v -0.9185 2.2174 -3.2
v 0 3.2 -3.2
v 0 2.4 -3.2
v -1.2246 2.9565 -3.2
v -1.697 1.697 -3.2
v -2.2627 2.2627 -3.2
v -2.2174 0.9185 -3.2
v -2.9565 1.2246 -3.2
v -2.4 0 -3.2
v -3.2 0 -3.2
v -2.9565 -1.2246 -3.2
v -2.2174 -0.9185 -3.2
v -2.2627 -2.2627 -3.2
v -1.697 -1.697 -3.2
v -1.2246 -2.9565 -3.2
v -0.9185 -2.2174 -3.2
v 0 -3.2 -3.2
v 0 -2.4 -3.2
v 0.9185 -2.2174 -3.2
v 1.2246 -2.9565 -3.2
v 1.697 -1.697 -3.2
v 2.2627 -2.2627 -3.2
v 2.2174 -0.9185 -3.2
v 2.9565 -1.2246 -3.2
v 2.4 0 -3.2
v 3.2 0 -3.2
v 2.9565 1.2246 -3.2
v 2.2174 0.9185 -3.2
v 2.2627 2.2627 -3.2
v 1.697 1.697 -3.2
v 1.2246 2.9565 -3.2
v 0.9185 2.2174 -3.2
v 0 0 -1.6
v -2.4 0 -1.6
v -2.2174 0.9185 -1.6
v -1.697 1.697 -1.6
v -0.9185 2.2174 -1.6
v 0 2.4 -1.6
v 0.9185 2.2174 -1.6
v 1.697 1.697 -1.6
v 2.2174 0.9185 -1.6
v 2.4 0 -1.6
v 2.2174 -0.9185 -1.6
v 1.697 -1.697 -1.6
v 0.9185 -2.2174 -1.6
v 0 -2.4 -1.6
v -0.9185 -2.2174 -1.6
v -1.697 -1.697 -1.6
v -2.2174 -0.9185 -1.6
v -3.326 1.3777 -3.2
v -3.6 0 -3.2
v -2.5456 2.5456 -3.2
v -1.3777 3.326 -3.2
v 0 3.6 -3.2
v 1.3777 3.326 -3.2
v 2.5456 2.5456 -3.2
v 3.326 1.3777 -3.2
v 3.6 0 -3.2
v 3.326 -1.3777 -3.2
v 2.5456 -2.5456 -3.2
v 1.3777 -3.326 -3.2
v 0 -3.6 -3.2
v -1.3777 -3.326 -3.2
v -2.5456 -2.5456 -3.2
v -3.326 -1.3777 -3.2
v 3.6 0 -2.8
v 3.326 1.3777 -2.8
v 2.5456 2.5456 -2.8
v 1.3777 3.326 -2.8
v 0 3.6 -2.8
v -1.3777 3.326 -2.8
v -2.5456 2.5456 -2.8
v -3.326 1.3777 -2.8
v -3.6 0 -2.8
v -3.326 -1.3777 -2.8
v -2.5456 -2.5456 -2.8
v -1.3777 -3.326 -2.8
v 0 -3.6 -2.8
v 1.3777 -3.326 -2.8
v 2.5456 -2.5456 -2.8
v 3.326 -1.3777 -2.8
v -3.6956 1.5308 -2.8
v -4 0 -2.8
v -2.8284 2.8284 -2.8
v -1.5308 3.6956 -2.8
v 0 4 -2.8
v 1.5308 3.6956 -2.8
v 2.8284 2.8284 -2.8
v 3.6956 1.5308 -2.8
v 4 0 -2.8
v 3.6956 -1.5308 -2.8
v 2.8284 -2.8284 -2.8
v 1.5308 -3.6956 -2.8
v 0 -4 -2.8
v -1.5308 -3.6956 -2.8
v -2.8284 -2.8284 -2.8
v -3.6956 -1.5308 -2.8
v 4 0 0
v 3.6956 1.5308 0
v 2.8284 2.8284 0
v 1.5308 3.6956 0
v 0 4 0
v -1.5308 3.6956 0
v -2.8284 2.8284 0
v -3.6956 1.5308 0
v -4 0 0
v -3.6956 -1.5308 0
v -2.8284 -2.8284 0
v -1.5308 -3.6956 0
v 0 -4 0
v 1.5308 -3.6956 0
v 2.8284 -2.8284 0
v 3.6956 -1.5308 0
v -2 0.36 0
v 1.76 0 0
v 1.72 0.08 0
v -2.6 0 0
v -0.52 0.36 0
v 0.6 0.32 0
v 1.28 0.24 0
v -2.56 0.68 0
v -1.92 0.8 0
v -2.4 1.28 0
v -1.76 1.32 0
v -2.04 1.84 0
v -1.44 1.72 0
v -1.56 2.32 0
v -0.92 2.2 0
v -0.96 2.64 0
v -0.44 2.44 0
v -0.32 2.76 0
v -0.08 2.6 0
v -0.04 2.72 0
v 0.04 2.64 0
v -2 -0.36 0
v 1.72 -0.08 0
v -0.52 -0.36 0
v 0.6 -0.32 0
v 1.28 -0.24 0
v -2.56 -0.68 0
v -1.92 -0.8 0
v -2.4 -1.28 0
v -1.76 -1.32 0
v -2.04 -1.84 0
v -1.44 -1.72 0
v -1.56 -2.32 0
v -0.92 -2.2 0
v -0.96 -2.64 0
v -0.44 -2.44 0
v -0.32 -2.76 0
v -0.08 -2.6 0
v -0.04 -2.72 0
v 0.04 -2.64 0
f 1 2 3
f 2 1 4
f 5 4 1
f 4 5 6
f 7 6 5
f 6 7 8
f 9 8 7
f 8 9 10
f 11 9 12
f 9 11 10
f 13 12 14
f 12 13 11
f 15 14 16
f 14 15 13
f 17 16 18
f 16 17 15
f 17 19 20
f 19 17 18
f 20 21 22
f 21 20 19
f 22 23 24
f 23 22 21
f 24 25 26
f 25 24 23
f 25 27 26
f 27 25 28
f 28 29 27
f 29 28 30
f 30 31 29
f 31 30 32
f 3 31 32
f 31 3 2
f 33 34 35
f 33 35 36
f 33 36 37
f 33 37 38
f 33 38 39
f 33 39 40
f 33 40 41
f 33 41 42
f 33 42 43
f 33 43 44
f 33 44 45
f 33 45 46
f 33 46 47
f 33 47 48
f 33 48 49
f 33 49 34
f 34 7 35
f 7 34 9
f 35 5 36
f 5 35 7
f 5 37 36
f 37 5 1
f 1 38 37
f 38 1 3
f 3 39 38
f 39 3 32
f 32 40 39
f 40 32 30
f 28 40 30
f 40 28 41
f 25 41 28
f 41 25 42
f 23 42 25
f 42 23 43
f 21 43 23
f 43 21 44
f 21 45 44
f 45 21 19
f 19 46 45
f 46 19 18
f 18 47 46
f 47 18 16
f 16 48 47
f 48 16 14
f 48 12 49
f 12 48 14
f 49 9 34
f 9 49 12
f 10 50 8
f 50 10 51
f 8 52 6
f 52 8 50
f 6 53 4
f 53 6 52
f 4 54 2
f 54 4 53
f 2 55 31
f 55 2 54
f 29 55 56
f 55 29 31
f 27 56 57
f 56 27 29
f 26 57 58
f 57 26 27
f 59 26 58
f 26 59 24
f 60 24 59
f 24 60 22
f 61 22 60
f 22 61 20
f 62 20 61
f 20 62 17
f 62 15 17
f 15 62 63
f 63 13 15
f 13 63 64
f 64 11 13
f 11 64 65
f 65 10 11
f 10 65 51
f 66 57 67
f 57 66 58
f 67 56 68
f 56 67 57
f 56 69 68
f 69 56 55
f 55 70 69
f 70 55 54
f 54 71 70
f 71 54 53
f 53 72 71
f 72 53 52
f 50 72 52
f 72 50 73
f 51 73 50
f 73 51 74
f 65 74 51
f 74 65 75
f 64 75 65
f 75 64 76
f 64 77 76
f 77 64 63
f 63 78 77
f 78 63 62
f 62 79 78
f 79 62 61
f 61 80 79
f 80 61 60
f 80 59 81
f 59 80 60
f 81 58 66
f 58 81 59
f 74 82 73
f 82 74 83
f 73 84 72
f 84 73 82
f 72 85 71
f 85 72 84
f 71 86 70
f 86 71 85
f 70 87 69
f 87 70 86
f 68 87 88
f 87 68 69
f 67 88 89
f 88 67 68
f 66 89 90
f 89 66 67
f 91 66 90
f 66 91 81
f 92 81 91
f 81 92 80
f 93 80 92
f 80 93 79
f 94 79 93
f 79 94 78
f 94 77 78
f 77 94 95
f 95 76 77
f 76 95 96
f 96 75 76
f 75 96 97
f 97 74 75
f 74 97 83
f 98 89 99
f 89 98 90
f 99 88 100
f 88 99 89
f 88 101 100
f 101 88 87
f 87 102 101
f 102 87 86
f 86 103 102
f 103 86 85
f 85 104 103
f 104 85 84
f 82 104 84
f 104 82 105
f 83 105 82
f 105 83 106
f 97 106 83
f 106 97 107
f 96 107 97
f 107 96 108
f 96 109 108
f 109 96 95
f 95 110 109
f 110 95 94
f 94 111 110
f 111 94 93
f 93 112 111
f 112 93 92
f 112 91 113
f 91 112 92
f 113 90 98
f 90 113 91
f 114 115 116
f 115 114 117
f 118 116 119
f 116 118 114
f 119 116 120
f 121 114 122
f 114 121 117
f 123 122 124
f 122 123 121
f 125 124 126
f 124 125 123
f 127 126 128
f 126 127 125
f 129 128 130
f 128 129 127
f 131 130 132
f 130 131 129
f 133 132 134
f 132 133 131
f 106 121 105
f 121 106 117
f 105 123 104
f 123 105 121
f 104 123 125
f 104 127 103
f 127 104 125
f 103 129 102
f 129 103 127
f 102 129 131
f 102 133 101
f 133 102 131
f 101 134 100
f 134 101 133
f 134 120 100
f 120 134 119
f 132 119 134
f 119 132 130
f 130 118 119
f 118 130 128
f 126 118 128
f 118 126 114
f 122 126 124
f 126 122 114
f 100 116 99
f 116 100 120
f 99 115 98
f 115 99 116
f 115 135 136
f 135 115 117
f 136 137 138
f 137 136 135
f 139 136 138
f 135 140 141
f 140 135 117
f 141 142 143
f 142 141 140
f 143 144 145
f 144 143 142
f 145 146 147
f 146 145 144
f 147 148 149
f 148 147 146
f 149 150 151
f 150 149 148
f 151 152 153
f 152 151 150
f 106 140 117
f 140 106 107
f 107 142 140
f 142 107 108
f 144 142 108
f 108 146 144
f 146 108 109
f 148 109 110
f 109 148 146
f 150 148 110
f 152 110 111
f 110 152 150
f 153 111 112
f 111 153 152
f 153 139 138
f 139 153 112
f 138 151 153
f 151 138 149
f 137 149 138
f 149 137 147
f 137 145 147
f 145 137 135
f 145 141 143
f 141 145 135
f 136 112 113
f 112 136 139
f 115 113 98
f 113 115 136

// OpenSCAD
// file: ../p/4-4disc.scad
use <../lib.scad>
function ldraw_lib__4_4disc() = [
// 0 Disc 1.0
// 0 Name: 4-4disc.dat
// 0 Author: James Jessiman
// 0 !LDRAW_ORG Primitive UPDATE 2002-02
// 0 !LICENSE Licensed under CC BY 4.0 : see CAreadme.txt
// 
// 0 BFC CERTIFY CCW
  [0,"BFC","CERTIFY"],
  [0,"BFC","CCW"],
// 
// 0 !HISTORY 1998-12-15 [PTadmin] Official Update 1998-10
// 0 !HISTORY 2002-03-23 [sbliss] Added BFC statement
// 0 !HISTORY 2002-04-25 [PTadmin] Official Update 2002-02
// 0 !HISTORY 2007-06-24 [PTadmin] Header formatted for Contributor Agreement
// 0 !HISTORY 2008-07-01 [PTadmin] Official Update 2008-01
// 
// 
// 3 16 0 0 0 1 0 0 0.9239 0 0.3827
  [3,16,0,0,0,1,0,0,0.9239,0,0.3827],
// 3 16 0 0 0 0.9239 0 0.3827 0.7071 0 0.7071
  [3,16,0,0,0,0.9239,0,0.3827,0.7071,0,0.7071],
// 3 16 0 0 0 0.7071 0 0.7071 0.3827 0 0.9239
  [3,16,0,0,0,0.7071,0,0.7071,0.3827,0,0.9239],
// 3 16 0 0 0 0.3827 0 0.9239 0 0 1
  [3,16,0,0,0,0.3827,0,0.9239,0,0,1],
// 3 16 0 0 0 0 0 1 -0.3827 0 0.9239
  [3,16,0,0,0,0,0,1,-0.3827,0,0.9239],
// 3 16 0 0 0 -0.3827 0 0.9239 -0.7071 0 0.7071
  [3,16,0,0,0,-0.3827,0,0.9239,-0.7071,0,0.7071],
// 3 16 0 0 0 -0.7071 0 0.7071 -0.9239 0 0.3827
  [3,16,0,0,0,-0.7071,0,0.7071,-0.9239,0,0.3827],
// 3 16 0 0 0 -0.9239 0 0.3827 -1 0 -0
  [3,16,0,0,0,-0.9239,0,0.3827,-1,0,-0],
// 3 16 0 0 0 -1 0 -0 -0.9239 0 -0.3827
  [3,16,0,0,0,-1,0,-0,-0.9239,0,-0.3827],
// 3 16 0 0 0 -0.9239 0 -0.3827 -0.7071 0 -0.7071
  [3,16,0,0,0,-0.9239,0,-0.3827,-0.7071,0,-0.7071],
// 3 16 0 0 0 -0.7071 0 -0.7071 -0.3827 0 -0.9239
  [3,16,0,0,0,-0.7071,0,-0.7071,-0.3827,0,-0.9239],
// 3 16 0 0 0 -0.3827 0 -0.9239 0 0 -1
  [3,16,0,0,0,-0.3827,0,-0.9239,0,0,-1],
// 3 16 0 0 0 0 0 -1 0.3827 0 -0.9239
  [3,16,0,0,0,0,0,-1,0.3827,0,-0.9239],
// 3 16 0 0 0 0.3827 0 -0.9239 0.7071 0 -0.7071
  [3,16,0,0,0,0.3827,0,-0.9239,0.7071,0,-0.7071],
// 3 16 0 0 0 0.7071 0 -0.7071 0.9239 0 -0.3827
  [3,16,0,0,0,0.7071,0,-0.7071,0.9239,0,-0.3827],
// 3 16 0 0 0 0.9239 0 -0.3827 1 0 0
  [3,16,0,0,0,0.9239,0,-0.3827,1,0,0],
// 0
];
module ldraw_lib__4_4disc(step=0, col=false, unit=2/5, alt=false, line=0.2, solid=!$preview)
    makepoly(ldraw_lib__4_4disc(), step=step, col=col, unit=unit, alt=alt, line=line, solid=solid);
ldraw_lib__4_4disc(line=0.2);
// file: ../p/4-4ring3.scad
use <../lib.scad>
function ldraw_lib__4_4ring3() = [
// 0 Ring  3 x 1.0
// 0 Name: 4-4ring3.dat
// 0 Author: James Jessiman
// 0 !LDRAW_ORG Primitive UPDATE 2009-01
// 0 !LICENSE Licensed under CC BY 4.0 : see CAreadme.txt
// 
// 0 BFC CERTIFY CCW
  [0,"BFC","CERTIFY"],
  [0,"BFC","CCW"],
// 
// 0 !HISTORY 1998-12-15 [PTadmin] Official Update 1998-10
// 0 !HISTORY 2002-04-05 [hafhead] Added BFC statement
// 0 !HISTORY 2002-04-25 [PTadmin] Official Update 2002-02
// 0 !HISTORY 2007-06-24 [PTadmin] Header formatted for Contributor Agreement
// 0 !HISTORY 2008-07-01 [PTadmin] Official Update 2008-01
// 0 !HISTORY 2008-08-26 [cwdee] Switch polygon winding and rename
// 0 !HISTORY 2009-05-02 [PTadmin] Official Update 2009-01
// 
// 
// 4 16 -1.5308 0 3.6956 -1.1481 0 2.7717 0 0 3 0 0 4
  [4,16,-1.5308,0,3.6956,-1.1481,0,2.7717,0,0,3,0,0,4],
// 4 16 -2.8284 0 2.8284 -2.1213 0 2.1213 -1.1481 0 2.7717 -1.5308 0 3.6956
  [4,16,-2.8284,0,2.8284,-2.1213,0,2.1213,-1.1481,0,2.7717,-1.5308,0,3.6956],
// 4 16 -3.6956 0 1.5308 -2.7717 0 1.1481 -2.1213 0 2.1213 -2.8284 0 2.8284
  [4,16,-3.6956,0,1.5308,-2.7717,0,1.1481,-2.1213,0,2.1213,-2.8284,0,2.8284],
// 4 16 -4 0 0 -3 0 0 -2.7717 0 1.1481 -3.6956 0 1.5308
  [4,16,-4,0,0,-3,0,0,-2.7717,0,1.1481,-3.6956,0,1.5308],
// 4 16 -3.6956 0 -1.5308 -2.7717 0 -1.1481 -3 0 0 -4 0 0
  [4,16,-3.6956,0,-1.5308,-2.7717,0,-1.1481,-3,0,0,-4,0,0],
// 4 16 -2.8284 0 -2.8284 -2.1213 0 -2.1213 -2.7717 0 -1.1481 -3.6956 0 -1.5308
  [4,16,-2.8284,0,-2.8284,-2.1213,0,-2.1213,-2.7717,0,-1.1481,-3.6956,0,-1.5308],
// 4 16 -1.5308 0 -3.6956 -1.1481 0 -2.7717 -2.1213 0 -2.1213 -2.8284 0 -2.8284
  [4,16,-1.5308,0,-3.6956,-1.1481,0,-2.7717,-2.1213,0,-2.1213,-2.8284,0,-2.8284],
// 4 16 0 0 -4 0 0 -3 -1.1481 0 -2.7717 -1.5308 0 -3.6956
  [4,16,0,0,-4,0,0,-3,-1.1481,0,-2.7717,-1.5308,0,-3.6956],
// 4 16 1.5308 0 -3.6956 1.1481 0 -2.7717 0 0 -3 0 0 -4
  [4,16,1.5308,0,-3.6956,1.1481,0,-2.7717,0,0,-3,0,0,-4],
// 4 16 2.8284 0 -2.8284 2.1213 0 -2.1213 1.1481 0 -2.7717 1.5308 0 -3.6956
  [4,16,2.8284,0,-2.8284,2.1213,0,-2.1213,1.1481,0,-2.7717,1.5308,0,-3.6956],
// 4 16 3.6956 0 -1.5308 2.7717 0 -1.1481 2.1213 0 -2.1213 2.8284 0 -2.8284
  [4,16,3.6956,0,-1.5308,2.7717,0,-1.1481,2.1213,0,-2.1213,2.8284,0,-2.8284],
// 4 16 4 0 0 3 0 0 2.7717 0 -1.1481 3.6956 0 -1.5308
  [4,16,4,0,0,3,0,0,2.7717,0,-1.1481,3.6956,0,-1.5308],
// 4 16 3.6956 0 1.5308 2.7717 0 1.1481 3 0 0 4 0 0
  [4,16,3.6956,0,1.5308,2.7717,0,1.1481,3,0,0,4,0,0],
// 4 16 2.8284 0 2.8284 2.1213 0 2.1213 2.7717 0 1.1481 3.6956 0 1.5308
  [4,16,2.8284,0,2.8284,2.1213,0,2.1213,2.7717,0,1.1481,3.6956,0,1.5308],
// 4 16 1.5308 0 3.6956 1.1481 0 2.7717 2.1213 0 2.1213 2.8284 0 2.8284
  [4,16,1.5308,0,3.6956,1.1481,0,2.7717,2.1213,0,2.1213,2.8284,0,2.8284],
// 4 16 0 0 4 0 0 3 1.1481 0 2.7717 1.5308 0 3.6956
  [4,16,0,0,4,0,0,3,1.1481,0,2.7717,1.5308,0,3.6956],
// 0
];
module ldraw_lib__4_4ring3(step=0, col=false, unit=2/5, alt=false, line=0.2, solid=!$preview)
    makepoly(ldraw_lib__4_4ring3(), step=step, col=col, unit=unit, alt=alt, line=line, solid=solid);
ldraw_lib__4_4ring3(line=0.2);
// file: ../p/4-4cylc.scad
use <../lib.scad>
use <4-4cyli.scad>
use <4-4disc.scad>
use <4-4edge.scad>
function ldraw_lib__4_4cylc() = [
// 0 Cylinder Closed 1.0
// 0 Name: 4-4cylc.dat
// 0 Author: Alex Taylor [anathema]
// 0 !LDRAW_ORG Primitive UPDATE 2009-02
// 0 !LICENSE Licensed under CC BY 4.0 : see CAreadme.txt
// 
// 0 BFC CERTIFY CCW
  [0,"BFC","CERTIFY"],
  [0,"BFC","CCW"],
// 
// 0 !HISTORY 2008-12-29 [cwdee] Removed one disc
// 0 !HISTORY 2009-09-03 [PTadmin] Official Update 2009-02
// 
// 
// 1 16 0 0 0 1 0 0 0 1 0 0 0 1 4-4edge.dat
  [1,16,0,0,0,1,0,0,0,1,0,0,0,1, ldraw_lib__4_4edge()],
// 1 16 0 1 0 1 0 0 0 1 0 0 0 1 4-4edge.dat
  [1,16,0,1,0,1,0,0,0,1,0,0,0,1, ldraw_lib__4_4edge()],
// 1 16 0 0 0 1 0 0 0 1 0 0 0 1 4-4disc.dat
  [1,16,0,0,0,1,0,0,0,1,0,0,0,1, ldraw_lib__4_4disc()],
// 1 16 0 0 0 1 0 0 0 1 0 0 0 1 4-4cyli.dat
  [1,16,0,0,0,1,0,0,0,1,0,0,0,1, ldraw_lib__4_4cyli()],
// 0
];
module ldraw_lib__4_4cylc(step=0, col=false, unit=2/5, alt=false, line=0.2, solid=!$preview)
    makepoly(ldraw_lib__4_4cylc(), step=step, col=col, unit=unit, alt=alt, line=line, solid=solid);
ldraw_lib__4_4cylc(line=0.2);
// file: ../p/4-4edge.scad
use <../lib.scad>
function ldraw_lib__4_4edge() = [
// 0 Circle 1.0
// 0 Name: 4-4edge.dat
// 0 Author: James Jessiman
// 0 !LDRAW_ORG Primitive UPDATE 2017-01
// 0 !LICENSE Licensed under CC BY 4.0 : see CAreadme.txt
// 
// 0 BFC CERTIFY CCW
  [0,"BFC","CERTIFY"],
  [0,"BFC","CCW"],
// 
// 0 !HISTORY 1998-12-15 [PTadmin] Official Update 1998-10
// 0 !HISTORY 2005-12-28 [PTadmin] Official Update 2005-01
// 0 !HISTORY 2007-06-24 [PTadmin] Header formatted for Contributor Agreement
// 0 !HISTORY 2008-07-01 [PTadmin] Official Update 2008-01
// 0 !HISTORY 2017-01-15 [Steffen] BFCed
// 0 !HISTORY 2017-12-30 [PTadmin] Official Update 2017-01
// 
// 
// 2 24 1 0 0 0.9239 0 0.3827
  [2,24,1,0,0,0.9239,0,0.3827],
// 2 24 0.9239 0 0.3827 0.7071 0 0.7071
  [2,24,0.9239,0,0.3827,0.7071,0,0.7071],
// 2 24 0.7071 0 0.7071 0.3827 0 0.9239
  [2,24,0.7071,0,0.7071,0.3827,0,0.9239],
// 2 24 0.3827 0 0.9239 0 0 1
  [2,24,0.3827,0,0.9239,0,0,1],
// 2 24 0 0 1 -0.3827 0 0.9239
  [2,24,0,0,1,-0.3827,0,0.9239],
// 2 24 -0.3827 0 0.9239 -0.7071 0 0.7071
  [2,24,-0.3827,0,0.9239,-0.7071,0,0.7071],
// 2 24 -0.7071 0 0.7071 -0.9239 0 0.3827
  [2,24,-0.7071,0,0.7071,-0.9239,0,0.3827],
// 2 24 -0.9239 0 0.3827 -1 0 -0
  [2,24,-0.9239,0,0.3827,-1,0,-0],
// 2 24 -1 0 -0 -0.9239 0 -0.3827
  [2,24,-1,0,-0,-0.9239,0,-0.3827],
// 2 24 -0.9239 0 -0.3827 -0.7071 0 -0.7071
  [2,24,-0.9239,0,-0.3827,-0.7071,0,-0.7071],
// 2 24 -0.7071 0 -0.7071 -0.3827 0 -0.9239
  [2,24,-0.7071,0,-0.7071,-0.3827,0,-0.9239],
// 2 24 -0.3827 0 -0.9239 0 0 -1
  [2,24,-0.3827,0,-0.9239,0,0,-1],
// 2 24 0 0 -1 0.3827 0 -0.9239
  [2,24,0,0,-1,0.3827,0,-0.9239],
// 2 24 0.3827 0 -0.9239 0.7071 0 -0.7071
  [2,24,0.3827,0,-0.9239,0.7071,0,-0.7071],
// 2 24 0.7071 0 -0.7071 0.9239 0 -0.3827
  [2,24,0.7071,0,-0.7071,0.9239,0,-0.3827],
// 2 24 0.9239 0 -0.3827 1 0 0
  [2,24,0.9239,0,-0.3827,1,0,0],
];
module ldraw_lib__4_4edge(step=0, col=false, unit=2/5, alt=false, line=0.2, solid=!$preview)
    makepoly(ldraw_lib__4_4edge(), step=step, col=col, unit=unit, alt=alt, line=line, solid=solid);
ldraw_lib__4_4edge(line=0.2);
// file: ../p/4-4cyli.scad
use <../lib.scad>
function ldraw_lib__4_4cyli() = [
// 0 Cylinder 1.0
// 0 Name: 4-4cyli.dat
// 0 Author: James Jessiman
// 0 !LDRAW_ORG Primitive UPDATE 2005-01
// 0 !LICENSE Licensed under CC BY 4.0 : see CAreadme.txt
// 
// 0 BFC CERTIFY CCW
  [0,"BFC","CERTIFY"],
  [0,"BFC","CCW"],
// 
// 0 !HISTORY 1998-12-15 [PTadmin] Official Update 1998-10
// 0 !HISTORY 2002-03-23 [sbliss] Added BFC statement; merged headers from files in distributions LDraw 0.27 and Complete.
// 0 !HISTORY 2002-04-25 [PTadmin] Official Update 2002-02
// 0 !HISTORY 2004-12-14 [guyvivan] BFC CCW
// 0 !HISTORY 2005-12-28 [PTadmin] Official Update 2005-01
// 0 !HISTORY 2007-06-24 [PTadmin] Header formatted for Contributor Agreement
// 0 !HISTORY 2008-07-01 [PTadmin] Official Update 2008-01
// 
// 
// 4 16 1 1 0 0.9239 1 0.3827 0.9239 0 0.3827 1 0 0
  [4,16,1,1,0,0.9239,1,0.3827,0.9239,0,0.3827,1,0,0],
// 5 24 1 0 0 1 1 0 0.9239 0 0.3827 0.9239 0 -0.3827
  [5,24,1,0,0,1,1,0,0.9239,0,0.3827,0.9239,0,-0.3827],
// 4 16 0.9239 1 0.3827 0.7071 1 0.7071 0.7071 0 0.7071 0.9239 0 0.3827
  [4,16,0.9239,1,0.3827,0.7071,1,0.7071,0.7071,0,0.7071,0.9239,0,0.3827],
// 5 24 0.9239 0 0.3827 0.9239 1 0.3827 0.7071 0 0.7071 1 0 0
  [5,24,0.9239,0,0.3827,0.9239,1,0.3827,0.7071,0,0.7071,1,0,0],
// 4 16 0.7071 1 0.7071 0.3827 1 0.9239 0.3827 0 0.9239 0.7071 0 0.7071
  [4,16,0.7071,1,0.7071,0.3827,1,0.9239,0.3827,0,0.9239,0.7071,0,0.7071],
// 5 24 0.7071 0 0.7071 0.7071 1 0.7071 0.3827 0 0.9239 0.9239 0 0.3827
  [5,24,0.7071,0,0.7071,0.7071,1,0.7071,0.3827,0,0.9239,0.9239,0,0.3827],
// 4 16 0.3827 1 0.9239 0 1 1 0 0 1 0.3827 0 0.9239
  [4,16,0.3827,1,0.9239,0,1,1,0,0,1,0.3827,0,0.9239],
// 5 24 0.3827 0 0.9239 0.3827 1 0.9239 0 0 1 0.7071 0 0.7071
  [5,24,0.3827,0,0.9239,0.3827,1,0.9239,0,0,1,0.7071,0,0.7071],
// 4 16 0 1 1 -0.3827 1 0.9239 -0.3827 0 0.9239 0 0 1
  [4,16,0,1,1,-0.3827,1,0.9239,-0.3827,0,0.9239,0,0,1],
// 5 24 0 0 1 0 1 1 -0.3827 0 0.9239 0.3827 0 0.9239
  [5,24,0,0,1,0,1,1,-0.3827,0,0.9239,0.3827,0,0.9239],
// 4 16 -0.3827 1 0.9239 -0.7071 1 0.7071 -0.7071 0 0.7071 -0.3827 0 0.9239
  [4,16,-0.3827,1,0.9239,-0.7071,1,0.7071,-0.7071,0,0.7071,-0.3827,0,0.9239],
// 5 24 -0.3827 0 0.9239 -0.3827 1 0.9239 -0.7071 0 0.7071 0 0 1
  [5,24,-0.3827,0,0.9239,-0.3827,1,0.9239,-0.7071,0,0.7071,0,0,1],
// 4 16 -0.7071 1 0.7071 -0.9239 1 0.3827 -0.9239 0 0.3827 -0.7071 0 0.7071
  [4,16,-0.7071,1,0.7071,-0.9239,1,0.3827,-0.9239,0,0.3827,-0.7071,0,0.7071],
// 5 24 -0.7071 0 0.7071 -0.7071 1 0.7071 -0.9239 0 0.3827 -0.3827 0 0.9239
  [5,24,-0.7071,0,0.7071,-0.7071,1,0.7071,-0.9239,0,0.3827,-0.3827,0,0.9239],
// 4 16 -0.9239 1 0.3827 -1 1 0 -1 0 0 -0.9239 0 0.3827
  [4,16,-0.9239,1,0.3827,-1,1,0,-1,0,0,-0.9239,0,0.3827],
// 5 24 -0.9239 0 0.3827 -0.9239 1 0.3827 -1 0 0 -0.7071 0 0.7071
  [5,24,-0.9239,0,0.3827,-0.9239,1,0.3827,-1,0,0,-0.7071,0,0.7071],
// 4 16 -1 1 0 -0.9239 1 -0.3827 -0.9239 0 -0.3827 -1 0 0
  [4,16,-1,1,0,-0.9239,1,-0.3827,-0.9239,0,-0.3827,-1,0,0],
// 5 24 -1 0 0 -1 1 0 -0.9239 0 -0.3827 -0.9239 0 0.3827
  [5,24,-1,0,0,-1,1,0,-0.9239,0,-0.3827,-0.9239,0,0.3827],
// 4 16 -0.9239 1 -0.3827 -0.7071 1 -0.7071 -0.7071 0 -0.7071 -0.9239 0 -0.3827
  [4,16,-0.9239,1,-0.3827,-0.7071,1,-0.7071,-0.7071,0,-0.7071,-0.9239,0,-0.3827],
// 5 24 -0.9239 0 -0.3827 -0.9239 1 -0.3827 -0.7071 0 -0.7071 -1 0 0
  [5,24,-0.9239,0,-0.3827,-0.9239,1,-0.3827,-0.7071,0,-0.7071,-1,0,0],
// 4 16 -0.7071 1 -0.7071 -0.3827 1 -0.9239 -0.3827 0 -0.9239 -0.7071 0 -0.7071
  [4,16,-0.7071,1,-0.7071,-0.3827,1,-0.9239,-0.3827,0,-0.9239,-0.7071,0,-0.7071],
// 5 24 -0.7071 0 -0.7071 -0.7071 1 -0.7071 -0.3827 0 -0.9239 -0.9239 0 -0.3827
  [5,24,-0.7071,0,-0.7071,-0.7071,1,-0.7071,-0.3827,0,-0.9239,-0.9239,0,-0.3827],
// 4 16 -0.3827 1 -0.9239 0 1 -1 0 0 -1 -0.3827 0 -0.9239
  [4,16,-0.3827,1,-0.9239,0,1,-1,0,0,-1,-0.3827,0,-0.9239],
// 5 24 -0.3827 0 -0.9239 -0.3827 1 -0.9239 0 0 -1 -0.7071 0 -0.7071
  [5,24,-0.3827,0,-0.9239,-0.3827,1,-0.9239,0,0,-1,-0.7071,0,-0.7071],
// 4 16 0 1 -1 0.3827 1 -0.9239 0.3827 0 -0.9239 0 0 -1
  [4,16,0,1,-1,0.3827,1,-0.9239,0.3827,0,-0.9239,0,0,-1],
// 5 24 0 0 -1 0 1 -1 0.3827 0 -0.9239 -0.3827 0 -0.9239
  [5,24,0,0,-1,0,1,-1,0.3827,0,-0.9239,-0.3827,0,-0.9239],
// 4 16 0.3827 1 -0.9239 0.7071 1 -0.7071 0.7071 0 -0.7071 0.3827 0 -0.9239
  [4,16,0.3827,1,-0.9239,0.7071,1,-0.7071,0.7071,0,-0.7071,0.3827,0,-0.9239],
// 5 24 0.3827 0 -0.9239 0.3827 1 -0.9239 0.7071 0 -0.7071 0 0 -1
  [5,24,0.3827,0,-0.9239,0.3827,1,-0.9239,0.7071,0,-0.7071,0,0,-1],
// 4 16 0.7071 1 -0.7071 0.9239 1 -0.3827 0.9239 0 -0.3827 0.7071 0 -0.7071
  [4,16,0.7071,1,-0.7071,0.9239,1,-0.3827,0.9239,0,-0.3827,0.7071,0,-0.7071],
// 5 24 0.7071 0 -0.7071 0.7071 1 -0.7071 0.9239 0 -0.3827 0.3827 0 -0.9239
  [5,24,0.7071,0,-0.7071,0.7071,1,-0.7071,0.9239,0,-0.3827,0.3827,0,-0.9239],
// 4 16 0.9239 1 -0.3827 1 1 0 1 0 0 0.9239 0 -0.3827
  [4,16,0.9239,1,-0.3827,1,1,0,1,0,0,0.9239,0,-0.3827],
// 5 24 0.9239 0 -0.3827 0.9239 1 -0.3827 1 0 0 0.7071 0 -0.7071
  [5,24,0.9239,0,-0.3827,0.9239,1,-0.3827,1,0,0,0.7071,0,-0.7071],
// 0
];
module ldraw_lib__4_4cyli(step=0, col=false, unit=2/5, alt=false, line=0.2, solid=!$preview)
    makepoly(ldraw_lib__4_4cyli(), step=step, col=col, unit=unit, alt=alt, line=line, solid=solid);
ldraw_lib__4_4cyli(line=0.2);
// file: ../p/empty.scad
use <../lib.scad>
function ldraw_lib__empty() = [
// 0 Empty
// 0 Name: empty.dat
// 0 Author: Steffen [Steffen]
// 0 !LDRAW_ORG Primitive UPDATE 2015-01
// 0 !LICENSE Licensed under CC BY 4.0 : see CAreadme.txt
// 
// 0 BFC CERTIFY CCW
  [0,"BFC","CERTIFY"],
  [0,"BFC","CCW"],
// 
// 0 !HISTORY 2015-10-11 [PTadmin] Official Update 2015-01
// 
// 
// 0 // Tool MLCad cannot handle really empty files. This file is used as a workaround.
// 0 // It exceptionally contains forbidden non-LDRAW standard syntax to satisfy MLCad until it is fixed OR a different editor has become the de-facto LDRAW standard.
// 0 // The line being used here is an "impossible" conditional line which never should be visible,
// 0 // additionally hidden by a syntax explicitly hiding it from displaying.
// 
// 0 MLCAD HIDE 5 24 0 0 0 0.0001 0 0 0.0001 -0.0001 0 0 0 0
];
module ldraw_lib__empty(step=0, col=false, unit=2/5, alt=false, line=0.2, solid=!$preview)
    makepoly(ldraw_lib__empty(), step=step, col=col, unit=unit, alt=alt, line=line, solid=solid);
ldraw_lib__empty(line=0.2);
// file: ../p/stud4o.scad
use <../lib.scad>
use <4-4cylc.scad>
use <4-4ring3.scad>
function ldraw_lib__stud4o() = [
// 0 Stud Tube Open without Outer Cylinder
// 0 Name: stud4o.dat
// 0 Author: Magnus Forsberg [MagFors]
// 0 !LDRAW_ORG Primitive UPDATE 2011-02
// 0 !LICENSE Licensed under CC BY 4.0 : see CAreadme.txt
// 
// 0 !HELP This stud is a "antistud" to be used like a underside stud,
// 0 !HELP but without the outer cylinder.
// 0 !HELP 1 47 0 0 0 1 0 0 0 1 0 0 0 1 stud4.dat
// 
// 0 BFC CERTIFY CCW
  [0,"BFC","CERTIFY"],
  [0,"BFC","CCW"],
// 
// 0 !HISTORY 2011-12-29 [PTadmin] Official Update 2011-02
// 
// 
// 1 16 0 -4 0 2 0 0 0 1 0 0 0 2 4-4ring3.dat
  [1,16,0,-4,0,2,0,0,0,1,0,0,0,2, ldraw_lib__4_4ring3()],
// 0 BFC INVERTNEXT
  [0,"BFC","INVERTNEXT"],
// 1 16 0 0 0 -6 0 0 0 -4 0 0 0 6 4-4cylc.dat
  [1,16,0,0,0,-6,0,0,0,-4,0,0,0,6, ldraw_lib__4_4cylc()],
];
module ldraw_lib__stud4o(step=0, col=false, unit=2/5, alt=false, line=0.2, solid=!$preview)
    makepoly(ldraw_lib__stud4o(), step=step, col=col, unit=unit, alt=alt, line=line, solid=solid);
ldraw_lib__stud4o(line=0.2);
// file: ../p/4-4ring9.scad
use <../lib.scad>
function ldraw_lib__4_4ring9() = [
// 0 Ring  9 x 1.0
// 0 Name: 4-4ring9.dat
// 0 Author: Magnus Forsberg [MagFors]
// 0 !LDRAW_ORG Primitive UPDATE 2024-01
// 0 !LICENSE Licensed under CC BY 4.0 : see CAreadme.txt
// 
// 0 BFC CERTIFY CCW
  [0,"BFC","CERTIFY"],
  [0,"BFC","CCW"],
// 
// 0 !HISTORY 2004-04-22 [PTadmin] Official Update 2004-02
// 0 !HISTORY 2007-06-24 [PTadmin] Header formatted for Contributor Agreement
// 0 !HISTORY 2008-07-01 [PTadmin] Official Update 2008-01
// 0 !HISTORY 2024-01-04 [MagFors] Complete regeneration, original by jriley
// 0 !HISTORY 2024-01-29 [OrionP] Official Update 2024-01
// 
// 4 16 10 0 0 9.239 0 3.827 8.3151 0 3.4443 9 0 0
  [4,16,10,0,0,9.239,0,3.827,8.3151,0,3.4443,9,0,0],
// 4 16 9.239 0 3.827 7.071 0 7.071 6.3639 0 6.3639 8.3151 0 3.4443
  [4,16,9.239,0,3.827,7.071,0,7.071,6.3639,0,6.3639,8.3151,0,3.4443],
// 4 16 7.071 0 7.071 3.827 0 9.239 3.4443 0 8.3151 6.3639 0 6.3639
  [4,16,7.071,0,7.071,3.827,0,9.239,3.4443,0,8.3151,6.3639,0,6.3639],
// 4 16 3.827 0 9.239 0 0 10 0 0 9 3.4443 0 8.3151
  [4,16,3.827,0,9.239,0,0,10,0,0,9,3.4443,0,8.3151],
// 4 16 0 0 10 -3.827 0 9.239 -3.4443 0 8.3151 0 0 9
  [4,16,0,0,10,-3.827,0,9.239,-3.4443,0,8.3151,0,0,9],
// 4 16 -3.827 0 9.239 -7.071 0 7.071 -6.3639 0 6.3639 -3.4443 0 8.3151
  [4,16,-3.827,0,9.239,-7.071,0,7.071,-6.3639,0,6.3639,-3.4443,0,8.3151],
// 4 16 -7.071 0 7.071 -9.239 0 3.827 -8.3151 0 3.4443 -6.3639 0 6.3639
  [4,16,-7.071,0,7.071,-9.239,0,3.827,-8.3151,0,3.4443,-6.3639,0,6.3639],
// 4 16 -9.239 0 3.827 -10 0 0 -9 0 0 -8.3151 0 3.4443
  [4,16,-9.239,0,3.827,-10,0,0,-9,0,0,-8.3151,0,3.4443],
// 4 16 -10 0 0 -9.239 0 -3.827 -8.3151 0 -3.4443 -9 0 0
  [4,16,-10,0,0,-9.239,0,-3.827,-8.3151,0,-3.4443,-9,0,0],
// 4 16 -9.239 0 -3.827 -7.071 0 -7.071 -6.3639 0 -6.3639 -8.3151 0 -3.4443
  [4,16,-9.239,0,-3.827,-7.071,0,-7.071,-6.3639,0,-6.3639,-8.3151,0,-3.4443],
// 4 16 -7.071 0 -7.071 -3.827 0 -9.239 -3.4443 0 -8.3151 -6.3639 0 -6.3639
  [4,16,-7.071,0,-7.071,-3.827,0,-9.239,-3.4443,0,-8.3151,-6.3639,0,-6.3639],
// 4 16 -3.827 0 -9.239 0 0 -10 0 0 -9 -3.4443 0 -8.3151
  [4,16,-3.827,0,-9.239,0,0,-10,0,0,-9,-3.4443,0,-8.3151],
// 4 16 0 0 -10 3.827 0 -9.239 3.4443 0 -8.3151 0 0 -9
  [4,16,0,0,-10,3.827,0,-9.239,3.4443,0,-8.3151,0,0,-9],
// 4 16 3.827 0 -9.239 7.071 0 -7.071 6.3639 0 -6.3639 3.4443 0 -8.3151
  [4,16,3.827,0,-9.239,7.071,0,-7.071,6.3639,0,-6.3639,3.4443,0,-8.3151],
// 4 16 7.071 0 -7.071 9.239 0 -3.827 8.3151 0 -3.4443 6.3639 0 -6.3639
  [4,16,7.071,0,-7.071,9.239,0,-3.827,8.3151,0,-3.4443,6.3639,0,-6.3639],
// 4 16 9.239 0 -3.827 10 0 0 9 0 0 8.3151 0 -3.4443
  [4,16,9.239,0,-3.827,10,0,0,9,0,0,8.3151,0,-3.4443],
// 0 // Build by LDPartEditor (PrimGen 2.X)
];
module ldraw_lib__4_4ring9(step=0, col=false, unit=2/5, alt=false, line=0.2, solid=!$preview)
    makepoly(ldraw_lib__4_4ring9(), step=step, col=col, unit=unit, alt=alt, line=line, solid=solid);
ldraw_lib__4_4ring9(line=0.2);
// file: ../p/4-4ring8.scad
use <../lib.scad>
function ldraw_lib__4_4ring8() = [
// 0 Ring  8 x 1.0
// 0 Name: 4-4ring8.dat
// 0 Author: Steffen [Steffen]
// 0 !LDRAW_ORG Primitive UPDATE 2012-01
// 0 !LICENSE Licensed under CC BY 4.0 : see CAreadme.txt
// 
// 0 BFC CERTIFY CCW
  [0,"BFC","CERTIFY"],
  [0,"BFC","CCW"],
// 
// 0 !HISTORY 2003-12-19 [PTadmin] Official Update 2003-03
// 0 !HISTORY 2007-06-24 [PTadmin] Header formatted for Contributor Agreement
// 0 !HISTORY 2008-07-01 [PTadmin] Official Update 2008-01
// 0 !HISTORY 2012-02-16 [Philo] Changed to CCW
// 0 !HISTORY 2012-03-30 [PTadmin] Official Update 2012-01
// 
// 
// 4 16 9 0 0 8.3151 0 3.4443 7.3912 0 3.0616 8 0 0
  [4,16,9,0,0,8.3151,0,3.4443,7.3912,0,3.0616,8,0,0],
// 4 16 8.3151 0 3.4443 6.3639 0 6.3639 5.6568 0 5.6568 7.3912 0 3.0616
  [4,16,8.3151,0,3.4443,6.3639,0,6.3639,5.6568,0,5.6568,7.3912,0,3.0616],
// 4 16 6.3639 0 6.3639 3.4443 0 8.3151 3.0616 0 7.3912 5.6568 0 5.6568
  [4,16,6.3639,0,6.3639,3.4443,0,8.3151,3.0616,0,7.3912,5.6568,0,5.6568],
// 4 16 3.4443 0 8.3151 0 0 9 0 0 8 3.0616 0 7.3912
  [4,16,3.4443,0,8.3151,0,0,9,0,0,8,3.0616,0,7.3912],
// 4 16 0 0 9 -3.4443 0 8.3151 -3.0616 0 7.3912 0 0 8
  [4,16,0,0,9,-3.4443,0,8.3151,-3.0616,0,7.3912,0,0,8],
// 4 16 -3.4443 0 8.3151 -6.3639 0 6.3639 -5.6568 0 5.6568 -3.0616 0 7.3912
  [4,16,-3.4443,0,8.3151,-6.3639,0,6.3639,-5.6568,0,5.6568,-3.0616,0,7.3912],
// 4 16 -6.3639 0 6.3639 -8.3151 0 3.4443 -7.3912 0 3.0616 -5.6568 0 5.6568
  [4,16,-6.3639,0,6.3639,-8.3151,0,3.4443,-7.3912,0,3.0616,-5.6568,0,5.6568],
// 4 16 -8.3151 0 3.4443 -9 0 0 -8 0 0 -7.3912 0 3.0616
  [4,16,-8.3151,0,3.4443,-9,0,0,-8,0,0,-7.3912,0,3.0616],
// 4 16 -9 0 0 -8.3151 0 -3.4443 -7.3912 0 -3.0616 -8 0 0
  [4,16,-9,0,0,-8.3151,0,-3.4443,-7.3912,0,-3.0616,-8,0,0],
// 4 16 -8.3151 0 -3.4443 -6.3639 0 -6.3639 -5.6568 0 -5.6568 -7.3912 0 -3.0616
  [4,16,-8.3151,0,-3.4443,-6.3639,0,-6.3639,-5.6568,0,-5.6568,-7.3912,0,-3.0616],
// 4 16 -6.3639 0 -6.3639 -3.4443 0 -8.3151 -3.0616 0 -7.3912 -5.6568 0 -5.6568
  [4,16,-6.3639,0,-6.3639,-3.4443,0,-8.3151,-3.0616,0,-7.3912,-5.6568,0,-5.6568],
// 4 16 -3.4443 0 -8.3151 0 0 -9 0 0 -8 -3.0616 0 -7.3912
  [4,16,-3.4443,0,-8.3151,0,0,-9,0,0,-8,-3.0616,0,-7.3912],
// 4 16 0 0 -9 3.4443 0 -8.3151 3.0616 0 -7.3912 0 0 -8
  [4,16,0,0,-9,3.4443,0,-8.3151,3.0616,0,-7.3912,0,0,-8],
// 4 16 3.4443 0 -8.3151 6.3639 0 -6.3639 5.6568 0 -5.6568 3.0616 0 -7.3912
  [4,16,3.4443,0,-8.3151,6.3639,0,-6.3639,5.6568,0,-5.6568,3.0616,0,-7.3912],
// 4 16 6.3639 0 -6.3639 8.3151 0 -3.4443 7.3912 0 -3.0616 5.6568 0 -5.6568
  [4,16,6.3639,0,-6.3639,8.3151,0,-3.4443,7.3912,0,-3.0616,5.6568,0,-5.6568],
// 4 16 8.3151 0 -3.4443 9 0 0 8 0 0 7.3912 0 -3.0616
  [4,16,8.3151,0,-3.4443,9,0,0,8,0,0,7.3912,0,-3.0616],
];
module ldraw_lib__4_4ring8(step=0, col=false, unit=2/5, alt=false, line=0.2, solid=!$preview)
    makepoly(ldraw_lib__4_4ring8(), step=step, col=col, unit=unit, alt=alt, line=line, solid=solid);
ldraw_lib__4_4ring8(line=0.2);
// file: ../p/4-4cylo.scad
use <../lib.scad>
use <4-4cyli.scad>
use <4-4edge.scad>
function ldraw_lib__4_4cylo() = [
// 0 Cylinder Open 1.0
// 0 Name: 4-4cylo.dat
// 0 Author: Mark Kennedy [mkennedy]
// 0 !LDRAW_ORG Primitive UPDATE 2010-01
// 0 !LICENSE Licensed under CC BY 4.0 : see CAreadme.txt
// 
// 0 BFC CERTIFY CCW
  [0,"BFC","CERTIFY"],
  [0,"BFC","CCW"],
// 
// 0 !HISTORY 2010-04-05 [PTadmin] Official Update 2010-01
// 
// 
// 1 16 0 0 0 1 0 0 0 1 0 0 0 1 4-4edge.dat
  [1,16,0,0,0,1,0,0,0,1,0,0,0,1, ldraw_lib__4_4edge()],
// 1 16 0 1 0 1 0 0 0 1 0 0 0 1 4-4edge.dat
  [1,16,0,1,0,1,0,0,0,1,0,0,0,1, ldraw_lib__4_4edge()],
// 1 16 0 0 0 1 0 0 0 1 0 0 0 1 4-4cyli.dat
  [1,16,0,0,0,1,0,0,0,1,0,0,0,1, ldraw_lib__4_4cyli()],
// 0
];
module ldraw_lib__4_4cylo(step=0, col=false, unit=2/5, alt=false, line=0.2, solid=!$preview)
    makepoly(ldraw_lib__4_4cylo(), step=step, col=col, unit=unit, alt=alt, line=line, solid=solid);
ldraw_lib__4_4cylo(line=0.2);
// file: ../p/1-16chrd.scad
use <../lib.scad>
use <empty.scad>
function ldraw_lib__1_16chrd() = [
// 0 Chord 0.0625
// 0 Name: 1-16chrd.dat
// 0 Author: Philippe Hurbain [Philo]
// 0 !LDRAW_ORG Primitive UPDATE 2015-01
// 0 !LICENSE Licensed under CC BY 4.0 : see CAreadme.txt
// 
// 0 BFC CERTIFY CCW
  [0,"BFC","CERTIFY"],
  [0,"BFC","CCW"],
// 
// 0 !HISTORY 2015-10-11 [PTadmin] Official Update 2015-01
// 
// 
// 0 // This file is intentionally empty because at the current \P resolution,
// 0 // an 1-16chrd is actually empty. However, this file still is present
// 0 // to allow tools to do primitives substition and fill in a real chrd here,
// 0 // or, if desired, to substitute this with the hi-res 48\1-16chrd.
// 
// 0 // This file is based on an idea by Darats at http://forums.ldraw.org/read.php?19,14500,14500#msg-14500
// 
// 1 16 0 0 0 1 0 0 0 1 0 0 0 1 empty.dat
  [1,16,0,0,0,1,0,0,0,1,0,0,0,1, ldraw_lib__empty()],
];
module ldraw_lib__1_16chrd(step=0, col=false, unit=2/5, alt=false, line=0.2, solid=!$preview)
    makepoly(ldraw_lib__1_16chrd(), step=step, col=col, unit=unit, alt=alt, line=line, solid=solid);
ldraw_lib__1_16chrd(line=0.2);
// file: s/98138s02.scad
use <../../lib.scad>
use <../../p/4-4cylo.scad>
use <../../p/4-4ring8.scad>
use <../../p/4-4ring9.scad>
use <../../p/stud4o.scad>
function ldraw_lib__s__98138s02() = [
// 0 ~Tile  1 x  1 Round with Groove without Complete Top Face
// 0 Name: s\98138s02.dat
// 0 Author: Magnus Forsberg [MagFors]
// 0 !LDRAW_ORG Subpart UPDATE 2020-01
// 0 !LICENSE Licensed under CC BY 4.0 : see CAreadme.txt
// 
// 0 BFC CERTIFY CCW
  [0,"BFC","CERTIFY"],
  [0,"BFC","CCW"],
// 
// 0 !HISTORY 2020-06-28 [PTadmin] Official Update 2020-01
// 
// 
// 1 16 0 4 0 1 0 0 0 -1 0 0 0 1 stud4o.dat
  [1,16,0,4,0,1,0,0,0,-1,0,0,0,1, ldraw_lib__stud4o()],
// 1 16 0 8 0 -1 0 0 0 -1 0 0 0 1 4-4ring8.dat
  [1,16,0,8,0,-1,0,0,0,-1,0,0,0,1, ldraw_lib__4_4ring8()],
// 1 16 0 7 0 9 0 0 0 1 0 0 0 9 4-4cylo.dat
  [1,16,0,7,0,9,0,0,0,1,0,0,0,9, ldraw_lib__4_4cylo()],
// 1 16 0 7 0 -1 0 0 0 -1 0 0 0 1 4-4ring9.dat
  [1,16,0,7,0,-1,0,0,0,-1,0,0,0,1, ldraw_lib__4_4ring9()],
// 1 16 0 0 0 10 0 0 0 7 0 0 0 10 4-4cylo.dat
  [1,16,0,0,0,10,0,0,0,7,0,0,0,10, ldraw_lib__4_4cylo()],
];
module ldraw_lib__s__98138s02(step=0, col=false, unit=2/5, alt=false, line=0.2, solid=!$preview)
    makepoly(ldraw_lib__s__98138s02(), step=step, col=col, unit=unit, alt=alt, line=line, solid=solid);
ldraw_lib__s__98138s02(line=0.2);
// file: s/98138ph1s01.scad
use <../../lib.scad>
function ldraw_lib__s__98138ph1s01() = [
// 0 ~Tile  1 x  1 Round with Curved Black Lines Pattern - Half
// 0 Name: s\98138ph1s01.dat
// 0 Author: Takeshi Takahashi [RainbowDolphin]
// 0 !LDRAW_ORG Subpart UPDATE 2023-06
// 0 !LICENSE Licensed under CC BY 4.0 : see CAreadme.txt
// 
// 0 BFC CERTIFY CCW
  [0,"BFC","CERTIFY"],
  [0,"BFC","CCW"],
// 
// 0 !HISTORY 2023-11-19 [OrionP] Official Update 2023-06
// 
// 
// 4 0 -5 0 0.9 -6.5 0 0 4.4 0 0 4.3 0 0.2
  [4,0,-5,0,0.9,-6.5,0,0,4.4,0,0,4.3,0,0.2],
// 4 0 -1.3 0 0.9 -5 0 0.9 4.3 0 0.2 1.5 0 0.8
  [4,0,-1.3,0,0.9,-5,0,0.9,4.3,0,0.2,1.5,0,0.8],
// 3 0 1.5 0 0.8 4.3 0 0.2 3.2 0 0.6
  [3,0,1.5,0,0.8,4.3,0,0.2,3.2,0,0.6],
// 4 0 -6.4 0 1.7 -6.5 0 0 -5 0 0.9 -4.8 0 2
  [4,0,-6.4,0,1.7,-6.5,0,0,-5,0,0.9,-4.8,0,2],
// 4 0 -6 0 3.2 -6.4 0 1.7 -4.8 0 2 -4.4 0 3.3
  [4,0,-6,0,3.2,-6.4,0,1.7,-4.8,0,2,-4.4,0,3.3],
// 4 0 -5.1 0 4.6 -6 0 3.2 -4.4 0 3.3 -3.6 0 4.3
  [4,0,-5.1,0,4.6,-6,0,3.2,-4.4,0,3.3,-3.6,0,4.3],
// 4 0 -3.9 0 5.8 -5.1 0 4.6 -3.6 0 4.3 -2.3 0 5.5
  [4,0,-3.9,0,5.8,-5.1,0,4.6,-3.6,0,4.3,-2.3,0,5.5],
// 4 0 -2.4 0 6.6 -3.9 0 5.8 -2.3 0 5.5 -1.1 0 6.1
  [4,0,-2.4,0,6.6,-3.9,0,5.8,-2.3,0,5.5,-1.1,0,6.1],
// 4 0 -0.8 0 6.9 -2.4 0 6.6 -1.1 0 6.1 -0.2 0 6.5
  [4,0,-0.8,0,6.9,-2.4,0,6.6,-1.1,0,6.1,-0.2,0,6.5],
// 4 0 -0.1 0 6.8 -0.8 0 6.9 -0.2 0 6.5 0.1 0 6.6
  [4,0,-0.1,0,6.8,-0.8,0,6.9,-0.2,0,6.5,0.1,0,6.6],
// 4 16 -10 0 0 -6.5 0 0 -6.4 0 1.7 -9.239 0 3.827
  [4,16,-10,0,0,-6.5,0,0,-6.4,0,1.7,-9.239,0,3.827],
// 4 16 -9.239 0 3.827 -6.4 0 1.7 -6 0 3.2 -7.071 0 7.071
  [4,16,-9.239,0,3.827,-6.4,0,1.7,-6,0,3.2,-7.071,0,7.071],
// 3 16 -7.071 0 7.071 -6 0 3.2 -5.1 0 4.6
  [3,16,-7.071,0,7.071,-6,0,3.2,-5.1,0,4.6],
// 4 16 -7.071 0 7.071 -5.1 0 4.6 -3.9 0 5.8 -3.827 0 9.239
  [4,16,-7.071,0,7.071,-5.1,0,4.6,-3.9,0,5.8,-3.827,0,9.239],
// 4 16 -3.827 0 9.239 -3.9 0 5.8 -2.4 0 6.6 0 0 10
  [4,16,-3.827,0,9.239,-3.9,0,5.8,-2.4,0,6.6,0,0,10],
// 3 16 0 0 10 -2.4 0 6.6 -0.8 0 6.9
  [3,16,0,0,10,-2.4,0,6.6,-0.8,0,6.9],
// 4 16 0 0 10 -0.8 0 6.9 -0.1 0 6.8 3.827 0 9.239
  [4,16,0,0,10,-0.8,0,6.9,-0.1,0,6.8,3.827,0,9.239],
// 4 16 3.827 0 9.239 -0.1 0 6.8 0.1 0 6.6 7.071 0 7.071
  [4,16,3.827,0,9.239,-0.1,0,6.8,0.1,0,6.6,7.071,0,7.071],
// 4 16 3.2 0 0.6 7.071 0 7.071 0.1 0 6.6 1.5 0 0.8
  [4,16,3.2,0,0.6,7.071,0,7.071,0.1,0,6.6,1.5,0,0.8],
// 4 16 1.5 0 0.8 0.1 0 6.6 -0.2 0 6.5 -1.1 0 6.1
  [4,16,1.5,0,0.8,0.1,0,6.6,-0.2,0,6.5,-1.1,0,6.1],
// 4 16 -1.3 0 0.9 1.5 0 0.8 -1.1 0 6.1 -2.3 0 5.5
  [4,16,-1.3,0,0.9,1.5,0,0.8,-1.1,0,6.1,-2.3,0,5.5],
// 4 16 -1.3 0 0.9 -2.3 0 5.5 -3.6 0 4.3 -5 0 0.9
  [4,16,-1.3,0,0.9,-2.3,0,5.5,-3.6,0,4.3,-5,0,0.9],
// 4 16 -4.8 0 2 -5 0 0.9 -3.6 0 4.3 -4.4 0 3.3
  [4,16,-4.8,0,2,-5,0,0.9,-3.6,0,4.3,-4.4,0,3.3],
// 4 16 7.071 0 7.071 3.2 0 0.6 4.3 0 0.2 9.239 0 3.827
  [4,16,7.071,0,7.071,3.2,0,0.6,4.3,0,0.2,9.239,0,3.827],
// 4 16 9.239 0 3.827 4.3 0 0.2 4.4 0 0 10 0 0
  [4,16,9.239,0,3.827,4.3,0,0.2,4.4,0,0,10,0,0],
];
module ldraw_lib__s__98138ph1s01(step=0, col=false, unit=2/5, alt=false, line=0.2, solid=!$preview)
    makepoly(ldraw_lib__s__98138ph1s01(), step=step, col=col, unit=unit, alt=alt, line=line, solid=solid);
ldraw_lib__s__98138ph1s01(line=0.2);
// file: ../p/4-4ering.scad
use <../lib.scad>
use <1-16chrd.scad>
function ldraw_lib__4_4ering() = [
// 0 Adapter Ring Triangles to Normal 1.0
// 0 Name: 4-4ering.dat
// 0 Author: Philippe Hurbain [Philo]
// 0 !LDRAW_ORG Primitive UPDATE 2015-01
// 0 !LICENSE Licensed under CC BY 4.0 : see CAreadme.txt
// 
// 0 BFC CERTIFY CCW
  [0,"BFC","CERTIFY"],
  [0,"BFC","CCW"],
// 
// 0 !HISTORY 2015-10-11 [PTadmin] Official Update 2015-01
// 
// 
// 0 // This file uses 1-16chrd (actually empty). It allows
// 0 // tools to do primitives substition and fill in a ring of chrd here,
// 0 // or, if desired, to substitute this with the hi-res 48\1-16chrd.
// 0 // This file is based on an idea by Darats at http://forums.ldraw.org/read.php?19,14500,14500#msg-14500
// 
// 1 16 0 0 0 1 0 0 0 1 0 0 0 1 1-16chrd.dat
  [1,16,0,0,0,1,0,0,0,1,0,0,0,1, ldraw_lib__1_16chrd()],
// 1 16 0 0 0 0.92388 0 0.38268 0 1 0 -0.38268 0 0.92388 1-16chrd.dat
  [1,16,0,0,0,0.92388,0,0.38268,0,1,0,-0.38268,0,0.92388, ldraw_lib__1_16chrd()],
// 1 16 0 0 0 0.70711 0 0.70711 0 1 0 -0.70711 0 0.70711 1-16chrd.dat
  [1,16,0,0,0,0.70711,0,0.70711,0,1,0,-0.70711,0,0.70711, ldraw_lib__1_16chrd()],
// 1 16 0 0 0 0.38268 0 0.92388 0 1 0 -0.92388 0 0.38268 1-16chrd.dat
  [1,16,0,0,0,0.38268,0,0.92388,0,1,0,-0.92388,0,0.38268, ldraw_lib__1_16chrd()],
// 1 16 0 0 0 0 0 1 0 1 0 -1 0 0 1-16chrd.dat
  [1,16,0,0,0,0,0,1,0,1,0,-1,0,0, ldraw_lib__1_16chrd()],
// 1 16 0 0 0 -0.38268 0 0.92388 0 1 0 -0.92388 0 -0.38268 1-16chrd.dat
  [1,16,0,0,0,-0.38268,0,0.92388,0,1,0,-0.92388,0,-0.38268, ldraw_lib__1_16chrd()],
// 1 16 0 0 0 -0.70711 0 0.70711 0 1 0 -0.70711 0 -0.70711 1-16chrd.dat
  [1,16,0,0,0,-0.70711,0,0.70711,0,1,0,-0.70711,0,-0.70711, ldraw_lib__1_16chrd()],
// 1 16 0 0 0 -0.92388 0 0.38268 0 1 0 -0.38268 0 -0.92388 1-16chrd.dat
  [1,16,0,0,0,-0.92388,0,0.38268,0,1,0,-0.38268,0,-0.92388, ldraw_lib__1_16chrd()],
// 1 16 0 0 0 0 0 -1 0 1 0 1 0 0 1-16chrd.dat
  [1,16,0,0,0,0,0,-1,0,1,0,1,0,0, ldraw_lib__1_16chrd()],
// 1 16 0 0 0 0.38268 0 -0.92388 0 1 0 0.92388 0 0.38268 1-16chrd.dat
  [1,16,0,0,0,0.38268,0,-0.92388,0,1,0,0.92388,0,0.38268, ldraw_lib__1_16chrd()],
// 1 16 0 0 0 0.70711 0 -0.70711 0 1 0 0.70711 0 0.70711 1-16chrd.dat
  [1,16,0,0,0,0.70711,0,-0.70711,0,1,0,0.70711,0,0.70711, ldraw_lib__1_16chrd()],
// 1 16 0 0 0 0.92388 0 -0.38268 0 1 0 0.38268 0 0.92388 1-16chrd.dat
  [1,16,0,0,0,0.92388,0,-0.38268,0,1,0,0.38268,0,0.92388, ldraw_lib__1_16chrd()],
// 1 16 0 0 0 -1 0 0 0 1 0 0 0 -1 1-16chrd.dat
  [1,16,0,0,0,-1,0,0,0,1,0,0,0,-1, ldraw_lib__1_16chrd()],
// 1 16 0 0 0 -0.92388 0 -0.38268 0 1 0 0.38268 0 -0.92388 1-16chrd.dat
  [1,16,0,0,0,-0.92388,0,-0.38268,0,1,0,0.38268,0,-0.92388, ldraw_lib__1_16chrd()],
// 1 16 0 0 0 -0.70711 0 -0.70711 0 1 0 0.70711 0 -0.70711 1-16chrd.dat
  [1,16,0,0,0,-0.70711,0,-0.70711,0,1,0,0.70711,0,-0.70711, ldraw_lib__1_16chrd()],
// 1 16 0 0 0 -0.38268 0 -0.92388 0 1 0 0.92388 0 -0.38268 1-16chrd.dat
  [1,16,0,0,0,-0.38268,0,-0.92388,0,1,0,0.92388,0,-0.38268, ldraw_lib__1_16chrd()],
];
module ldraw_lib__4_4ering(step=0, col=false, unit=2/5, alt=false, line=0.2, solid=!$preview)
    makepoly(ldraw_lib__4_4ering(), step=step, col=col, unit=unit, alt=alt, line=line, solid=solid);
ldraw_lib__4_4ering(line=0.2);
// main file
use <../lib.scad>
use <../p/4-4ering.scad>
use <s/98138ph1s01.scad>
use <s/98138s02.scad>
function ldraw_lib__98138ph1() = [
// 0 Tile  1 x  1 Round with Curved Black Lines Pattern
// 0 Name: 98138ph1.dat
// 0 Author: Takeshi Takahashi [RainbowDolphin]
// 0 !LDRAW_ORG Part UPDATE 2023-06
// 0 !LICENSE Licensed under CC BY 4.0 : see CAreadme.txt
// 
// 0 BFC CERTIFY CCW
  [0,"BFC","CERTIFY"],
  [0,"BFC","CCW"],
// 
// 0 !KEYWORDS Bricklink 98138pb309, Extendable ear, Harry Potter
// 0 !KEYWORDS Rebrickable 98138pr0322, Set 76408
// 
// 0 !HISTORY 2023-11-19 [OrionP] Official Update 2023-06
// 
// 
// 1 16 0 0 0 1 0 0 0 1 0 0 0 1 s\98138s02.dat
  [1,16,0,0,0,1,0,0,0,1,0,0,0,1, ldraw_lib__s__98138s02()],
// 1 16 0 0 0 10 0 0 0 1 0 0 0 10 4-4ering.dat
  [1,16,0,0,0,10,0,0,0,1,0,0,0,10, ldraw_lib__4_4ering()],
// 1 16 0 0 0 1 0 0 0 1 0 0 0 1 s\98138ph1s01.dat
  [1,16,0,0,0,1,0,0,0,1,0,0,0,1, ldraw_lib__s__98138ph1s01()],
// 1 16 0 0 0 1 0 0 0 1 0 0 0 -1 s\98138ph1s01.dat
  [1,16,0,0,0,1,0,0,0,1,0,0,0,-1, ldraw_lib__s__98138ph1s01()],
];
module ldraw_lib__98138ph1(step=0, col=false, unit=2/5, alt=false, line=0.2, solid=!$preview)
    makepoly(ldraw_lib__98138ph1(), step=step, col=col, unit=unit, alt=alt, line=line, solid=solid);
ldraw_lib__98138ph1(line=0.2);
